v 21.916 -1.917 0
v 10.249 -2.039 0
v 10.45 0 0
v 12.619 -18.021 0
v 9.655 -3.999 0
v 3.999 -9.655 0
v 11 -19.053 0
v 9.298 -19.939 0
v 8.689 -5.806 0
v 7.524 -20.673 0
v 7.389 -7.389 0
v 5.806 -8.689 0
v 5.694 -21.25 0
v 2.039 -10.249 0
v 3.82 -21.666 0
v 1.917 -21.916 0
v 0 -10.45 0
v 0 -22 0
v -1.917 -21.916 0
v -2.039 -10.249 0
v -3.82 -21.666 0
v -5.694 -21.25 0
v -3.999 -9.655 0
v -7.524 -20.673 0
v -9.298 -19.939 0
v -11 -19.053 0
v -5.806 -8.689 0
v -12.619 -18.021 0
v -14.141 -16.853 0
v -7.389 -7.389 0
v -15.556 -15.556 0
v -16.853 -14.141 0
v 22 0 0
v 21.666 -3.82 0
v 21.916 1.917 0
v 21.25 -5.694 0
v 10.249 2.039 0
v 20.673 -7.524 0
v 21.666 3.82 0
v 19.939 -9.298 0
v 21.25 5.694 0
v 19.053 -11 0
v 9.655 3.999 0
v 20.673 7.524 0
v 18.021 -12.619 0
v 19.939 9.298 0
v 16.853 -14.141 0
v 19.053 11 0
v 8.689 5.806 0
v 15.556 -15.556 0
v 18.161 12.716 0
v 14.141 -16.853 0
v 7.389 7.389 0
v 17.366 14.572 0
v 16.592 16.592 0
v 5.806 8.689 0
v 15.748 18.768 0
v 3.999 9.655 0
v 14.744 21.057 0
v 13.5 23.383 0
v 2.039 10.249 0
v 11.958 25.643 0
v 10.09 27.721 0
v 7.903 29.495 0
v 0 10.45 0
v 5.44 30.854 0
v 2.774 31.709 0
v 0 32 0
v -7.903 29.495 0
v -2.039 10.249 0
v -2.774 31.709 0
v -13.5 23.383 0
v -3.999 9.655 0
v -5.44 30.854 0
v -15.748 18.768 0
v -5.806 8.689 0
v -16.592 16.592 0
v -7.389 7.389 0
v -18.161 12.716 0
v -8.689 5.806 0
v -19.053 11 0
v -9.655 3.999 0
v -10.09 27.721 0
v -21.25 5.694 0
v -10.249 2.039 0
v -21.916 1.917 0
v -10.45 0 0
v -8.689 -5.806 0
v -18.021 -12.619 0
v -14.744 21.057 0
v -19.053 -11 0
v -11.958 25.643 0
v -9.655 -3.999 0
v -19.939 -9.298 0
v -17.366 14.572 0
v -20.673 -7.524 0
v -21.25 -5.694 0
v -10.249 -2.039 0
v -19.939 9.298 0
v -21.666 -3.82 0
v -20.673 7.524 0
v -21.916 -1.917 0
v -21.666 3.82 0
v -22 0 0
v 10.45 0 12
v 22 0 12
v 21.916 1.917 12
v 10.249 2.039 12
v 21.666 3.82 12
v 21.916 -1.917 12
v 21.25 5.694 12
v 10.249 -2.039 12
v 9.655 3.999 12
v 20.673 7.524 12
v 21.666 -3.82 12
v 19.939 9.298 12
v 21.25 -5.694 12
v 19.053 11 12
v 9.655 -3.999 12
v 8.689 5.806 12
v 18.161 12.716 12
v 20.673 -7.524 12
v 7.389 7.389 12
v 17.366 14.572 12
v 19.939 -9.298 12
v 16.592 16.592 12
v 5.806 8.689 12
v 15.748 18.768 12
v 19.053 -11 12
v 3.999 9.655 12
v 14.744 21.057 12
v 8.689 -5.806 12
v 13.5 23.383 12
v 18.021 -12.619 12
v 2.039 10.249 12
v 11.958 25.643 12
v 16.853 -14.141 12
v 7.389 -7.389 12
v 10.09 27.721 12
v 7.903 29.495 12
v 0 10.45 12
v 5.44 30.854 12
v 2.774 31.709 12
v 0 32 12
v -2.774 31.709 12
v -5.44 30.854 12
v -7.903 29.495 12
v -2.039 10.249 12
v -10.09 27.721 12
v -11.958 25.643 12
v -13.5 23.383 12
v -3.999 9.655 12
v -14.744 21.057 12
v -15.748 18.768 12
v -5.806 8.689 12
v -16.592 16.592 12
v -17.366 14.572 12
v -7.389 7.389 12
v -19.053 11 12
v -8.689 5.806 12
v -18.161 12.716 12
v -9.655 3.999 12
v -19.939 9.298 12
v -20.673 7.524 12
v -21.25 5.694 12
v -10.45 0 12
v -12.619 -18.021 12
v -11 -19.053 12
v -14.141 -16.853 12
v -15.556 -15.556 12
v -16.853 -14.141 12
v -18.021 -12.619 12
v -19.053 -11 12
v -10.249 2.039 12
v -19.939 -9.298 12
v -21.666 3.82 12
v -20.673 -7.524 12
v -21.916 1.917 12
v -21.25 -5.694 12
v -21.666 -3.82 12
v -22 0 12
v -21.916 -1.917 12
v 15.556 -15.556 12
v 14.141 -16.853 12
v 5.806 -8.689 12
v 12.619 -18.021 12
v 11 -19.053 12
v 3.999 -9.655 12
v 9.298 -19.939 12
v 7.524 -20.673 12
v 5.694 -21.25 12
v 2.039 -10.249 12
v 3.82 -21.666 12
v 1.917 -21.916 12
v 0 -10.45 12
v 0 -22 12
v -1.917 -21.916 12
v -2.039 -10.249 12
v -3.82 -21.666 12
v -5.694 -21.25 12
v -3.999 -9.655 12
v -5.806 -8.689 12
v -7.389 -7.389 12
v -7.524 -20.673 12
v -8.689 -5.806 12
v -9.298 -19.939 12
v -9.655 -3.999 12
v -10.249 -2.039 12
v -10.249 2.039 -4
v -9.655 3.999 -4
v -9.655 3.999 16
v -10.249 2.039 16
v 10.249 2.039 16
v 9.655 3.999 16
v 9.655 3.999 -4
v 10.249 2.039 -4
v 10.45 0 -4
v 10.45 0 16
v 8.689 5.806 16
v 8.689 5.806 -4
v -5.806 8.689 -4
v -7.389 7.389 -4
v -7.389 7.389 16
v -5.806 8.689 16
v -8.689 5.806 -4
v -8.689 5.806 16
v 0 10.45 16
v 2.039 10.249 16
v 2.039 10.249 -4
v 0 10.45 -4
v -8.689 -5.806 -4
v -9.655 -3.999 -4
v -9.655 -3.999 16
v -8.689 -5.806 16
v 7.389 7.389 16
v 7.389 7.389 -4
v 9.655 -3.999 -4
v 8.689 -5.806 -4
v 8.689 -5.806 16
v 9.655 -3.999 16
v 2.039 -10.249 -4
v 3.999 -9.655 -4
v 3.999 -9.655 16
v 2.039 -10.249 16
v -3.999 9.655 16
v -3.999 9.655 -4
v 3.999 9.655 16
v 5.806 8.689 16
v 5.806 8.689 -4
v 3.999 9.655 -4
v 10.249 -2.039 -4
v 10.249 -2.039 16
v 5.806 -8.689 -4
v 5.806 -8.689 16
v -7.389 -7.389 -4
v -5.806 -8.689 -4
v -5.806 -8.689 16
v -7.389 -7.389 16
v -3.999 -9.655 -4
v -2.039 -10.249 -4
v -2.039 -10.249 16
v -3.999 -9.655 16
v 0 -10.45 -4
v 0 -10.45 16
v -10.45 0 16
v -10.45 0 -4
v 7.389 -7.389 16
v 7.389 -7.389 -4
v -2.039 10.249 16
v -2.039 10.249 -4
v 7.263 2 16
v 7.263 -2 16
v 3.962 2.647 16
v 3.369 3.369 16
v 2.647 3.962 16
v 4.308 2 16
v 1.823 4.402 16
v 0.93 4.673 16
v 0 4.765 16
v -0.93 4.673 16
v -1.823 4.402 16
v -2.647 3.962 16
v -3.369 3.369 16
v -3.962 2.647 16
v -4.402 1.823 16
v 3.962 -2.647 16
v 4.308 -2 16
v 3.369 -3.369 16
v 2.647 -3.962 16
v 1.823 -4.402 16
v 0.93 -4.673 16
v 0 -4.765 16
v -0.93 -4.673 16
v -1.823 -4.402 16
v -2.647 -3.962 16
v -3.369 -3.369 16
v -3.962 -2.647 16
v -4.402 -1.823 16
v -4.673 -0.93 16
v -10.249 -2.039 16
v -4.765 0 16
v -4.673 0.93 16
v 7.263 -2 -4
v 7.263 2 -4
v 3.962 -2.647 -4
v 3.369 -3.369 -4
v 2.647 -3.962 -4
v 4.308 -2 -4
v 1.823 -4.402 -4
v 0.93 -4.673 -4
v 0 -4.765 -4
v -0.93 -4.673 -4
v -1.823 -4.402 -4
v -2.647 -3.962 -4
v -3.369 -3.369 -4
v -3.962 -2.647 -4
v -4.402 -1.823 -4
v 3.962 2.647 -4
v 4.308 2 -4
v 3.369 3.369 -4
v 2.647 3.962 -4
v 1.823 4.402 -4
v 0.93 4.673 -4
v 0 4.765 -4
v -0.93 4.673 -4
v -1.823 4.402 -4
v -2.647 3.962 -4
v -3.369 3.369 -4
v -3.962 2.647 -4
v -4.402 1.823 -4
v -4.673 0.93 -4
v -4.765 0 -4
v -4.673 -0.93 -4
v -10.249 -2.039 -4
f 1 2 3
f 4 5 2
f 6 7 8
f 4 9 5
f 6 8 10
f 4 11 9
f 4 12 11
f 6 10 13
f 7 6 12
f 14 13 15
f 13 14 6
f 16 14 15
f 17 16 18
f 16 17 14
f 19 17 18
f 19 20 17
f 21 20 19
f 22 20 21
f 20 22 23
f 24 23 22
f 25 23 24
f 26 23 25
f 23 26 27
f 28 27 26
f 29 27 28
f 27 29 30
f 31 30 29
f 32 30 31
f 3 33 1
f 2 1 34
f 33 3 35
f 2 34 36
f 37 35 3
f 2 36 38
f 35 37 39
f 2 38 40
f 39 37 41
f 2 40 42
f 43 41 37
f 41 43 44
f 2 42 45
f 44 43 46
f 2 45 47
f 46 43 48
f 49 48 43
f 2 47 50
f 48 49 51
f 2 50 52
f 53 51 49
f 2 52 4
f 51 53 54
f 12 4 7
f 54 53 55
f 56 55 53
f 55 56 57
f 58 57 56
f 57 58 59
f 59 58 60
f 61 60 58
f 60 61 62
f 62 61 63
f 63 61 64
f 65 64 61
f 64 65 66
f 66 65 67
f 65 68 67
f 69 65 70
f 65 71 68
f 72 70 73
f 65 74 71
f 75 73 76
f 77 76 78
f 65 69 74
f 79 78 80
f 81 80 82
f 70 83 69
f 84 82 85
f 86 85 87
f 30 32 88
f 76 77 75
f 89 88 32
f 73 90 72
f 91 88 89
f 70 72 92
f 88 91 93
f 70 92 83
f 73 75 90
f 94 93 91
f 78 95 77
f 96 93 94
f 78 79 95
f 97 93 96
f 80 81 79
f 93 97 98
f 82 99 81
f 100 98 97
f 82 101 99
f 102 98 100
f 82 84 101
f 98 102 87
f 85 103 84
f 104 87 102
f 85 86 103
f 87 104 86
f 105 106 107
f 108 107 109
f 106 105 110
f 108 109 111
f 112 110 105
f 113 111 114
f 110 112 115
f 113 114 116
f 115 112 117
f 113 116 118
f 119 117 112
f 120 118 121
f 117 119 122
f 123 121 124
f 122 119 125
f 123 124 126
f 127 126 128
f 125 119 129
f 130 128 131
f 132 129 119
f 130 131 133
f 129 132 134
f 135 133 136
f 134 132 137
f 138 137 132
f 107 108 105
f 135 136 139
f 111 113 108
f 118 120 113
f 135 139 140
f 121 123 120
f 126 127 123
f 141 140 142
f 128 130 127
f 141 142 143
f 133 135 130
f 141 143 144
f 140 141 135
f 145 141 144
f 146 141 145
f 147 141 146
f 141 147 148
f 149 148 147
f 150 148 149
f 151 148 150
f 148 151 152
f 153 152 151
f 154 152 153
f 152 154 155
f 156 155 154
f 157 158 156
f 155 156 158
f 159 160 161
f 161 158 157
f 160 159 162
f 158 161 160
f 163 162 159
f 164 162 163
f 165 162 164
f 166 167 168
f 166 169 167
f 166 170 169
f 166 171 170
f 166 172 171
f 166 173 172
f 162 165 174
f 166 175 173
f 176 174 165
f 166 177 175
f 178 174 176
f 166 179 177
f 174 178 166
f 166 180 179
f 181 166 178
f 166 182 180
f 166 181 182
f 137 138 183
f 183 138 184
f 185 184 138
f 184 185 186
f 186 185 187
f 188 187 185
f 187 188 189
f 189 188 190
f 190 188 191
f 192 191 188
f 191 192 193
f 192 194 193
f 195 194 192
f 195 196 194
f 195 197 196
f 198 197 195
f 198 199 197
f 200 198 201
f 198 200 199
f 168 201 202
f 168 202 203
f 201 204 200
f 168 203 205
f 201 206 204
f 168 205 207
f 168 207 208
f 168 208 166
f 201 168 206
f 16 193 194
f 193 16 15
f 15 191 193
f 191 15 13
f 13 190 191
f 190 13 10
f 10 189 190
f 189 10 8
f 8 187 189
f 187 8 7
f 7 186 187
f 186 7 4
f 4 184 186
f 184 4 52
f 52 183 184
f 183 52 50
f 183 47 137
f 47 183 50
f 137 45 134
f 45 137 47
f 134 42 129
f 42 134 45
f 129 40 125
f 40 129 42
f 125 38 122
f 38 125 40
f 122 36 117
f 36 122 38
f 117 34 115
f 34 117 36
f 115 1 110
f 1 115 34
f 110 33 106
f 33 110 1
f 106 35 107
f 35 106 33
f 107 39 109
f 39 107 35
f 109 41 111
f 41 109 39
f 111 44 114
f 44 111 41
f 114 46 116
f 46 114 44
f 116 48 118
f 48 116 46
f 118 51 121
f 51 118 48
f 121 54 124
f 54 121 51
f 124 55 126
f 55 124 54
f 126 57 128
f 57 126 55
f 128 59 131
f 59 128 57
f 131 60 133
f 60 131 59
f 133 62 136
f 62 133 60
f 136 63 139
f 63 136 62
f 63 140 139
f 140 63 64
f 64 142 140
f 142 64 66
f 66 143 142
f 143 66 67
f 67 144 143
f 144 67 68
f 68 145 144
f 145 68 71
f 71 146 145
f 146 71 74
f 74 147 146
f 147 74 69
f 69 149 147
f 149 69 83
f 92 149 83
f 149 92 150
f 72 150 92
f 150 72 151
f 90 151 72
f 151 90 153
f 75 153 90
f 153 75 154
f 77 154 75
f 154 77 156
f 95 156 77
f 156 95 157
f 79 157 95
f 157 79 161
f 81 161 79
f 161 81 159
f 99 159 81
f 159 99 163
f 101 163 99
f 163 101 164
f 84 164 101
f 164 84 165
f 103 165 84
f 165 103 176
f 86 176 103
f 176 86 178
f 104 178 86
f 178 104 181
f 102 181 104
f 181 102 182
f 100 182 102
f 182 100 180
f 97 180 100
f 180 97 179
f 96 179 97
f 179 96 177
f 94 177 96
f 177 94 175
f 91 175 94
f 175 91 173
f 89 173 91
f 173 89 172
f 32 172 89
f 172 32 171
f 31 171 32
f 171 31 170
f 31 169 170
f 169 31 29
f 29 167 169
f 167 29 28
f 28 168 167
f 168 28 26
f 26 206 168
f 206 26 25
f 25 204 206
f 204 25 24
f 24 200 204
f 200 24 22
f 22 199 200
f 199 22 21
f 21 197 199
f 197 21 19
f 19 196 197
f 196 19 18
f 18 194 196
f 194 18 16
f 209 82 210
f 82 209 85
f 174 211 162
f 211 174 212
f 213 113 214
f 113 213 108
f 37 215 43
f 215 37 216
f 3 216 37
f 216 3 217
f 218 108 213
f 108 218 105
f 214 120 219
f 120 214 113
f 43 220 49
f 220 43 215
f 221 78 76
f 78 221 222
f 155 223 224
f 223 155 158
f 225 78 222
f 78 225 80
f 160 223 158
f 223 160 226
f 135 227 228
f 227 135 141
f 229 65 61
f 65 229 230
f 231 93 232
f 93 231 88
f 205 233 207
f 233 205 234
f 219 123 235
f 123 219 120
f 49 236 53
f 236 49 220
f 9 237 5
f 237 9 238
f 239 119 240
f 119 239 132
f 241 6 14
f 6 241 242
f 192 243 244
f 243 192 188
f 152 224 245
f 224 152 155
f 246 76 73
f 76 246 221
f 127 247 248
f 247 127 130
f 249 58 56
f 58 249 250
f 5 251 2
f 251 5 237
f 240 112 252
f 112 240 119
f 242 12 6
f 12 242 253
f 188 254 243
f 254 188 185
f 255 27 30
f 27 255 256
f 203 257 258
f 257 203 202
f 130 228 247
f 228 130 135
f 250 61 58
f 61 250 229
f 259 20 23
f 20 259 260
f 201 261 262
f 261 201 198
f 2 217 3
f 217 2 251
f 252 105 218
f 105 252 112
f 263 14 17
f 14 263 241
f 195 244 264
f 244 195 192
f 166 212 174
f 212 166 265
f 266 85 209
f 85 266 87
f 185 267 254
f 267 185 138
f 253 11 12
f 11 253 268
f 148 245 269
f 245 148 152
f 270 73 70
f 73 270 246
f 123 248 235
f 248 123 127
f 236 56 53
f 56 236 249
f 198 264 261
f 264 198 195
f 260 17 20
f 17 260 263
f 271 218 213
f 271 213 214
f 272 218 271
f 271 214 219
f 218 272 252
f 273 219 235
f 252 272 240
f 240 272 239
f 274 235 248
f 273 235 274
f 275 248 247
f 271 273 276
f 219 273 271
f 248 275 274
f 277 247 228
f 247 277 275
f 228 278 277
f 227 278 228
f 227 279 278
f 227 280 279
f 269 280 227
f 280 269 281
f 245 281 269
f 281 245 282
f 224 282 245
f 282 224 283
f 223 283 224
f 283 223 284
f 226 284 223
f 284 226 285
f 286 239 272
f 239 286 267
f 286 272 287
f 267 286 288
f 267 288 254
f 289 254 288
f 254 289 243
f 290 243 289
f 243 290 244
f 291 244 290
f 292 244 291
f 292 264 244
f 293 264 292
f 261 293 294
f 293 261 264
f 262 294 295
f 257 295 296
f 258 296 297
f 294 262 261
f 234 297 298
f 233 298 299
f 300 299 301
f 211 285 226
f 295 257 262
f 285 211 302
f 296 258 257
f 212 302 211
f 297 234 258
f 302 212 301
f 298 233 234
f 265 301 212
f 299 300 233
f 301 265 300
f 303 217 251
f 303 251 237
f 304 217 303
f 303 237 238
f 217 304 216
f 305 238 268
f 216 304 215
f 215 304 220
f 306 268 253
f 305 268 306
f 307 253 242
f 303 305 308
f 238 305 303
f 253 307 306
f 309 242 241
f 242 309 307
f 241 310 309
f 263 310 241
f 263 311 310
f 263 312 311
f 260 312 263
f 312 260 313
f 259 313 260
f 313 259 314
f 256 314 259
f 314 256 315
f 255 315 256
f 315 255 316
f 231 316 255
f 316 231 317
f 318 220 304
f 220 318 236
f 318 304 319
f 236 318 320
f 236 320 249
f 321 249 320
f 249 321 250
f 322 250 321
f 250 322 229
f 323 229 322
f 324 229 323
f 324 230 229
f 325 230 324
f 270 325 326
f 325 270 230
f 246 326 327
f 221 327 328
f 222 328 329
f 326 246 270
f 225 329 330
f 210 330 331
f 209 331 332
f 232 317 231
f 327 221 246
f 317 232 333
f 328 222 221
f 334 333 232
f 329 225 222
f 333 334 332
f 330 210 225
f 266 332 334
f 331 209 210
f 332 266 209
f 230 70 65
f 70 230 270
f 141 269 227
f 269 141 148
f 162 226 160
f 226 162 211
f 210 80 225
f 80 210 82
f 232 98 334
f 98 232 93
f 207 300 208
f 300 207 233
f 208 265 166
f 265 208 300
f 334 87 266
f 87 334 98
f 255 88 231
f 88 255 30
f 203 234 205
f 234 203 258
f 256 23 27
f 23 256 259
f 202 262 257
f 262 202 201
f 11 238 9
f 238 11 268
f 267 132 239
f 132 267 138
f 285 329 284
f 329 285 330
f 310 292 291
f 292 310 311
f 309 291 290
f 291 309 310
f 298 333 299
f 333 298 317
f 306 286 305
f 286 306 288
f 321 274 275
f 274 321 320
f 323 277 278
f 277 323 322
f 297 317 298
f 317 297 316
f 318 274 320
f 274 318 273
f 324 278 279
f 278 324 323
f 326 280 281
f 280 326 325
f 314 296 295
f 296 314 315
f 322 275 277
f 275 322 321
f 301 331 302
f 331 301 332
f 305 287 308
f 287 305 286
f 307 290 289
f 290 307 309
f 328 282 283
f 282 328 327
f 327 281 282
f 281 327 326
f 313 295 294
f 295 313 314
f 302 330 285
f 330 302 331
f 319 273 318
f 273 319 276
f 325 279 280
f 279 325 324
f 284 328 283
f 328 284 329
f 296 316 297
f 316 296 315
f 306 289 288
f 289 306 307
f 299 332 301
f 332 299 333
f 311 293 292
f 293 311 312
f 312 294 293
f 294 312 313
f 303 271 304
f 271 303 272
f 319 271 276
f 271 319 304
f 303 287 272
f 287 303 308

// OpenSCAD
$fn = 32;

// ----------------------------------------------------------------------
// Cam: base radius 22 mm with a 10 mm lift over 120 degrees
// ----------------------------------------------------------------------

// --- parameters (mm) ---
base_r = 22;              // base radius
lift = 10;                // lift height above the base radius
lift_span = 120;          // angular width of the lift
lift_start = 30;          // angle where the lift starts
cam_t = 12;               // cam plate thickness
hub_d = 20.9;             // hub diameter
hub_h = 20;               // hub height
bore_d = 9.53;            // bore
key_w = 4;                // keyway width
key_depth = 2;            // keyway depth

cam_profile = [[22, 0], [21.916, 1.917], [21.666, 3.82], [21.25, 5.694], [20.673, 7.524], [19.939, 9.298], [19.053, 11], [18.161, 12.716], [17.366, 14.572], [16.592, 16.592], [15.748, 18.768], [14.744, 21.057], [13.5, 23.383], [11.958, 25.643], [10.09, 27.721], [7.903, 29.495], [5.44, 30.854], [2.774, 31.709], [0, 32], [-2.774, 31.709], [-5.44, 30.854], [-7.903, 29.495], [-10.09, 27.721], [-11.958, 25.643], [-13.5, 23.383], [-14.744, 21.057], [-15.748, 18.768], [-16.592, 16.592], [-17.366, 14.572], [-18.161, 12.716], [-19.053, 11], [-19.939, 9.298], [-20.673, 7.524], [-21.25, 5.694], [-21.666, 3.82], [-21.916, 1.917], [-22, 0], [-21.916, -1.917], [-21.666, -3.82], [-21.25, -5.694], [-20.673, -7.524], [-19.939, -9.298], [-19.053, -11], [-18.021, -12.619], [-16.853, -14.141], [-15.556, -15.556], [-14.141, -16.853], [-12.619, -18.021], [-11, -19.053], [-9.298, -19.939], [-7.524, -20.673], [-5.694, -21.25], [-3.82, -21.666], [-1.917, -21.916], [0, -22], [1.917, -21.916], [3.82, -21.666], [5.694, -21.25], [7.524, -20.673], [9.298, -19.939], [11, -19.053], [12.619, -18.021], [14.141, -16.853], [15.556, -15.556], [16.853, -14.141], [18.021, -12.619], [19.053, -11], [19.939, -9.298], [20.673, -7.524], [21.25, -5.694], [21.666, -3.82], [21.916, -1.917]];

difference() {
  union() {
    linear_extrude(height = cam_t) polygon(cam_profile);
    /* hub, proud of the cam plate on both sides */
    translate([0, 0, -4]) cylinder(h = hub_h, d = hub_d);
  }
  /* bore through the hub, 2.5 mm clear on both faces */
  translate([0, 0, -6.5]) cylinder(h = hub_h + 5, d = bore_d);
  /* keyway, milled through the whole hub */
  translate([2.763, -2, -6.5]) cube([4.5, 4, 25]);
}
